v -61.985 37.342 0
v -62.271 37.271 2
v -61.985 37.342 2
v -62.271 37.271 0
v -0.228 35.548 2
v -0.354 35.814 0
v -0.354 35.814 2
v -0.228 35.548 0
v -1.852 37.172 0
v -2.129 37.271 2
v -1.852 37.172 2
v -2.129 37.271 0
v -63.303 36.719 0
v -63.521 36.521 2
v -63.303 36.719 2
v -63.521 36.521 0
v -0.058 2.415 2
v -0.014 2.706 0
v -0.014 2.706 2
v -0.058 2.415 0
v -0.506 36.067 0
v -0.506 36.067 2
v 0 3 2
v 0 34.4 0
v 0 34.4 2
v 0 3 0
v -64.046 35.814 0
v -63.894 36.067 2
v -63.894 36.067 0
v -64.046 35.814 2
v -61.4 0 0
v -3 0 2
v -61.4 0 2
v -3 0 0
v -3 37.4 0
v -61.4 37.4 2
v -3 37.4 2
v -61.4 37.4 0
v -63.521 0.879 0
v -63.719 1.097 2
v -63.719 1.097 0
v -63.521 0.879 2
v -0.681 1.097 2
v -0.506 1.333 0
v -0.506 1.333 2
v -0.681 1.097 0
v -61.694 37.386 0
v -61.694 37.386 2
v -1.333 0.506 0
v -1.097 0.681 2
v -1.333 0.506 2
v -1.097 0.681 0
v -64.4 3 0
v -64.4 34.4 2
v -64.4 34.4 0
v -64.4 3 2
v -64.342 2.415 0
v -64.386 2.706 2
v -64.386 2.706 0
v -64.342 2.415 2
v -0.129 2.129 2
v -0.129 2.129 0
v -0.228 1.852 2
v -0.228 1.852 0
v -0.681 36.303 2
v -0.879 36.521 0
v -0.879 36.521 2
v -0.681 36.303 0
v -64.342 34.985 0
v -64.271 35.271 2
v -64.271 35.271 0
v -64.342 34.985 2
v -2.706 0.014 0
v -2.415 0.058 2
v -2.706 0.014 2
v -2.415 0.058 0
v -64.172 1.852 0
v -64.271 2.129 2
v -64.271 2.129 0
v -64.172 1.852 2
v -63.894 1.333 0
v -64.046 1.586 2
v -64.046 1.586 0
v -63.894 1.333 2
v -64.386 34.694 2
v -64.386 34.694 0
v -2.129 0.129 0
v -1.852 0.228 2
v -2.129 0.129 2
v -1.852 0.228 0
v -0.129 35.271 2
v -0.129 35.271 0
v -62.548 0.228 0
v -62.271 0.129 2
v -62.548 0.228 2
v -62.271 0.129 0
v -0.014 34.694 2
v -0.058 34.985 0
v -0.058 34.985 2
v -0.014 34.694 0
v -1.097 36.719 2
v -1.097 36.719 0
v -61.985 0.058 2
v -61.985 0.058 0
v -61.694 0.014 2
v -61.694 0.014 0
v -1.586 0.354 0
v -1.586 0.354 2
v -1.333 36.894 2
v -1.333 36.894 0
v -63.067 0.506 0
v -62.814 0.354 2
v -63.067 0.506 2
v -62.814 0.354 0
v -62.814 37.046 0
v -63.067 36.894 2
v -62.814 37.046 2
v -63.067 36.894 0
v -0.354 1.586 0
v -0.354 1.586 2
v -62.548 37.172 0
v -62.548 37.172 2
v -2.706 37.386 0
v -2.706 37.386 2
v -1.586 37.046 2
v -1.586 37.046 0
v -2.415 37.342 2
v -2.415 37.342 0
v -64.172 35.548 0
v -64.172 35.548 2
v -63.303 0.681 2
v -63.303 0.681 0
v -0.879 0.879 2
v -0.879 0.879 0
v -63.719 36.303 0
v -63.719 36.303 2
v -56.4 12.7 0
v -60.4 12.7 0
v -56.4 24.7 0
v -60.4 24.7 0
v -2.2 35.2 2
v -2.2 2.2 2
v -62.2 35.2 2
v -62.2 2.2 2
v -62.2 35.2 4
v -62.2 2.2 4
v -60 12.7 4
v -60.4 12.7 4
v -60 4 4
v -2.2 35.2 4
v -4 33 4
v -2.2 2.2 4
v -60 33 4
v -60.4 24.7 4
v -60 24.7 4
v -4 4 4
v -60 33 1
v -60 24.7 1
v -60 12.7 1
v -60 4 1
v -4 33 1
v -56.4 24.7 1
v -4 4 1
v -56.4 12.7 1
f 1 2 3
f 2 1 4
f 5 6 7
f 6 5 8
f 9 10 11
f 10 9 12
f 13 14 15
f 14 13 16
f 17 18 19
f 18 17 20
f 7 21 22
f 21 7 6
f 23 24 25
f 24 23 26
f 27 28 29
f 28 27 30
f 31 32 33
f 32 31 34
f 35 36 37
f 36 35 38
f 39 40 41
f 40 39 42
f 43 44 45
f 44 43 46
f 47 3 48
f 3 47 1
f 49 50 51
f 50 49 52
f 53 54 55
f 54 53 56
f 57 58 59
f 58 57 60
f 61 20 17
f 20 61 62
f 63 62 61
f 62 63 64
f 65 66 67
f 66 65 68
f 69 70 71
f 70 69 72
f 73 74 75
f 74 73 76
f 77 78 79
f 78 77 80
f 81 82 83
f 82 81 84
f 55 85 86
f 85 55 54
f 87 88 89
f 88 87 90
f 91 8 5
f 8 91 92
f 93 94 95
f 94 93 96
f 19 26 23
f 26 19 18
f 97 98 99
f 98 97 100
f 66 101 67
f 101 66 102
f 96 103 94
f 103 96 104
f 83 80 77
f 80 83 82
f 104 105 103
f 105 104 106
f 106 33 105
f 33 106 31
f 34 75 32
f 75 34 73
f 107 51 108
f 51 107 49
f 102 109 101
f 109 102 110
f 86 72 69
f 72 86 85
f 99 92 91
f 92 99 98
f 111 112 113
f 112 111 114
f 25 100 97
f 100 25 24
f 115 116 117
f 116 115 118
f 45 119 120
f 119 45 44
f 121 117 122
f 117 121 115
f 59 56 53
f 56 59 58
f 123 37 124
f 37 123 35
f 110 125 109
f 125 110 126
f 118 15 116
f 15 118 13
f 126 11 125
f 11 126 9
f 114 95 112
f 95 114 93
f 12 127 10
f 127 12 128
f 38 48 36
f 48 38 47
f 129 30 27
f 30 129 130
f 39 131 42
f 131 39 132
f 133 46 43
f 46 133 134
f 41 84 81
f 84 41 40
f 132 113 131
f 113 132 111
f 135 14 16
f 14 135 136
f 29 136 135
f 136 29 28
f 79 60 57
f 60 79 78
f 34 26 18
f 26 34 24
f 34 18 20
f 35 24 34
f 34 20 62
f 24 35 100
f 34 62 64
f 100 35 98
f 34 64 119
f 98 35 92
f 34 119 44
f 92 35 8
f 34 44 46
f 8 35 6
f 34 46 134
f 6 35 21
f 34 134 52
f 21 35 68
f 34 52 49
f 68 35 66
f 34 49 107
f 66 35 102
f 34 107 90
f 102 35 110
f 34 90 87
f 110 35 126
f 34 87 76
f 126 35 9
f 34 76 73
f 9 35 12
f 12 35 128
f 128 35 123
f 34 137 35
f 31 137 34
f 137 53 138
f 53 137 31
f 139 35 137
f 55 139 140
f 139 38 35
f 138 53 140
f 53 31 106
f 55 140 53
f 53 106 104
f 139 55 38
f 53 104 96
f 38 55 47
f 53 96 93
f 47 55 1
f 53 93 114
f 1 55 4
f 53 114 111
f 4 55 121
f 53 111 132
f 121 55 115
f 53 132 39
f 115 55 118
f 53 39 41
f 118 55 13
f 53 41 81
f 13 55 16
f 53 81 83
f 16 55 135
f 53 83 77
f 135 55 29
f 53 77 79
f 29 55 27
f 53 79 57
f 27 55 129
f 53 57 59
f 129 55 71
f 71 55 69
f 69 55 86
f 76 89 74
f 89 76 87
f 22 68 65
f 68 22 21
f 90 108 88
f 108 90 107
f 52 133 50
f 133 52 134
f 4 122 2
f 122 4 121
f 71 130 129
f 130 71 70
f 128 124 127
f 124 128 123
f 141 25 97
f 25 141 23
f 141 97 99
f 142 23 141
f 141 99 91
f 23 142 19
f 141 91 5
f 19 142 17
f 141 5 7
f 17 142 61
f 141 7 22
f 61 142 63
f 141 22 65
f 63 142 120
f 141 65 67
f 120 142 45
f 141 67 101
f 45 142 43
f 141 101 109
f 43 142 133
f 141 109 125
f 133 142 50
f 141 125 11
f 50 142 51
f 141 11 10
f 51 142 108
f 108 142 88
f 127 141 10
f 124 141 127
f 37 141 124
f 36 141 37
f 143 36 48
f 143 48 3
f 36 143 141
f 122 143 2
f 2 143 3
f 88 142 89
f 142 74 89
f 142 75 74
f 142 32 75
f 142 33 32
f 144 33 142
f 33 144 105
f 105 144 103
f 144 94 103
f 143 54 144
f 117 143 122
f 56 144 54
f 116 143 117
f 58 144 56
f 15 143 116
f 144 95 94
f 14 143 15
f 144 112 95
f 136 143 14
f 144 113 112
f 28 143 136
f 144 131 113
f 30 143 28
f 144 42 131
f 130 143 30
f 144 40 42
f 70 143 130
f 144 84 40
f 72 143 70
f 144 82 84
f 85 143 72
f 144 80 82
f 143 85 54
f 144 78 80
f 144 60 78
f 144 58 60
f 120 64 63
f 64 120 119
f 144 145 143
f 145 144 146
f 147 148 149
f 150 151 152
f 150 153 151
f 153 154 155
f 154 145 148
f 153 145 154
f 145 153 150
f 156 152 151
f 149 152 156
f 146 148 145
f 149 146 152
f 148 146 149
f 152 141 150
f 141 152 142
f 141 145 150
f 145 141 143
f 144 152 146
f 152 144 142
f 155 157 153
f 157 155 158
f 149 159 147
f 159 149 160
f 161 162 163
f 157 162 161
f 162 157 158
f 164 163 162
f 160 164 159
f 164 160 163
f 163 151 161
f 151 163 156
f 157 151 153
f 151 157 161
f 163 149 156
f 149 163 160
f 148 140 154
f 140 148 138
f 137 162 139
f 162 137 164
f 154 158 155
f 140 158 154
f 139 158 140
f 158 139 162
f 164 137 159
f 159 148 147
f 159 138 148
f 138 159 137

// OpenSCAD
// --- sélecteur d'affichage pour l'impression ---
// 1 = base du boîtier seul, 2 = couvercle seul, 3 = les deux pièces
choix_piece = 2; 

// --- paramètres du boîtier (dimensions internes basées sur tes mesures) ---
longueur_interne = 60;
largeur_interne  = 33;
hauteur_interne  = 16;
epaisseur_paroi  = 2;
jeu              = 0.4; // espace pour insérer facilement la carte
rayon_boitier    = 3;   // rayon de l'arrondi des coins externes

// --- paramètres des bandes latérales internes (bords gauche et droit) ---
bande_largeur   = 2; // largeur de la bande à l'intérieur
bande_epaisseur = 3; // épaisseur (hauteur) de la bande depuis le fond

// --- paramètres de la découpe du clavier ---
clavier_longueur = 0;
clavier_largeur  = 0;
clavier_epaisseur= 1; // profondeur du renfoncement sur le couvercle

// --- calculs des dimensions externes ---
longueur_externe = longueur_interne + (2 * epaisseur_paroi) + jeu;
largeur_externe  = largeur_interne + (2 * epaisseur_paroi) + jeu;
hauteur_boite    = hauteur_interne + epaisseur_paroi;

$fn = 64; // lissage des arrondis

// --- logique d'affichage selon le choix de l'option ---
if (choix_piece == 1) {
    base_boitier();
}
else if (choix_piece == 2) {
    // positionné directement à plat en z=0 si imprimé seul
    translate([0, 0, epaisseur_paroi]) 
        rotate([0, 180, 0]) 
        couvercle();
}
else if (choix_piece == 3) {
    translate([0, 0, 0]) base_boitier();
    
    // décalé sur l'axe y pour ne pas chevaucher la base
    translate([longueur_externe, largeur_externe + 10, epaisseur_paroi]) 
        rotate([0, 180, 0]) 
        couvercle();
}

// --- module d'aide : cube avec coins verticaux arrondis ---
module cube_arrondi(x, y, z, r) {
    translate([r, r, 0])
    minkowski() {
        cube([x - 2*r, y - 2*r, z - 0.1]);
        cylinder(r = r, h = 0.1);
    }
}

// --- module : base du boîtier ---
module base_boitier() {
    difference() {
        // volume externe de la boîte avec coins arrondis
        cube_arrondi(longueur_externe, largeur_externe, hauteur_boite, rayon_boitier);
        
        // évidement interne principal pour le nodemcu
        translate([epaisseur_paroi, epaisseur_paroi, epaisseur_paroi])
            cube([longueur_interne + jeu, largeur_interne + jeu, hauteur_boite]);
        
        // ouverture frontale pour l'accès au port usb-c
        translate([-1, (largeur_externe / 2) - 6, epaisseur_paroi])
            cube([epaisseur_paroi + 2, 12, 7]);
        
        // encoche fine à l'arrière pour faire passer la nappe plate du clavier
        translate([longueur_externe - epaisseur_paroi - 1, (largeur_externe / 2) - 7, hauteur_boite - 1.5])
            cube([epaisseur_paroi + 2, 14, 2]);
    }
    
    // ajout des deux bandes de maintien sur toute la longueur interne
    // elles sont ajoutées après la "difference" pour ne pas être creusées
    
    // bande latérale gauche (le long du bord inférieur y)
    translate([epaisseur_paroi, epaisseur_paroi, epaisseur_paroi])
        cube([longueur_interne + jeu, bande_largeur, bande_epaisseur]);
        
    // bande latérale droite (le long du bord supérieur y)
    translate([epaisseur_paroi, largeur_externe - epaisseur_paroi - bande_largeur, epaisseur_paroi])
        cube([longueur_interne + jeu, bande_largeur, bande_epaisseur]);
}

// --- module : couvercle avec emplacement clavier ---
module couvercle() {
    difference() {
        union() {
            // plaque supérieure externe du couvercle avec les mêmes coins arrondis
            cube_arrondi(longueur_externe, largeur_externe, epaisseur_paroi, rayon_boitier);
            
            // lèvre interne droite pour emboîter et maintenir le couvercle en place
            translate([epaisseur_paroi + (jeu/2), epaisseur_paroi + (jeu/2), -epaisseur_paroi])
                cube([longueur_interne, largeur_interne, epaisseur_paroi]);
        }
        
        // évidement interne de la lèvre pour économiser du filament et laisser de la place
        translate([epaisseur_paroi * 2, epaisseur_paroi * 2, -epaisseur_paroi - 1])
            cube([longueur_interne - (epaisseur_paroi * 2), largeur_interne - (epaisseur_paroi * 2), epaisseur_paroi + 2]);
            
        // renfoncement sur le dessus pour intégrer le clavier à fleur du couvercle
        translate([(longueur_externe - clavier_longueur) / 2, (largeur_externe - clavier_largeur) / 2, epaisseur_paroi - clavier_epaisseur])
            cube([clavier_longueur, clavier_largeur, clavier_epaisseur + 1]);
            
        // fente débouchante au bout du renfoncement pour glisser la nappe à l'intérieur du boîtier
        translate([longueur_externe - epaisseur_paroi - 6, (largeur_externe - 12) / 2, -epaisseur_paroi - 2])
            cube([4, 12, hauteur_boite]);
    }
}
